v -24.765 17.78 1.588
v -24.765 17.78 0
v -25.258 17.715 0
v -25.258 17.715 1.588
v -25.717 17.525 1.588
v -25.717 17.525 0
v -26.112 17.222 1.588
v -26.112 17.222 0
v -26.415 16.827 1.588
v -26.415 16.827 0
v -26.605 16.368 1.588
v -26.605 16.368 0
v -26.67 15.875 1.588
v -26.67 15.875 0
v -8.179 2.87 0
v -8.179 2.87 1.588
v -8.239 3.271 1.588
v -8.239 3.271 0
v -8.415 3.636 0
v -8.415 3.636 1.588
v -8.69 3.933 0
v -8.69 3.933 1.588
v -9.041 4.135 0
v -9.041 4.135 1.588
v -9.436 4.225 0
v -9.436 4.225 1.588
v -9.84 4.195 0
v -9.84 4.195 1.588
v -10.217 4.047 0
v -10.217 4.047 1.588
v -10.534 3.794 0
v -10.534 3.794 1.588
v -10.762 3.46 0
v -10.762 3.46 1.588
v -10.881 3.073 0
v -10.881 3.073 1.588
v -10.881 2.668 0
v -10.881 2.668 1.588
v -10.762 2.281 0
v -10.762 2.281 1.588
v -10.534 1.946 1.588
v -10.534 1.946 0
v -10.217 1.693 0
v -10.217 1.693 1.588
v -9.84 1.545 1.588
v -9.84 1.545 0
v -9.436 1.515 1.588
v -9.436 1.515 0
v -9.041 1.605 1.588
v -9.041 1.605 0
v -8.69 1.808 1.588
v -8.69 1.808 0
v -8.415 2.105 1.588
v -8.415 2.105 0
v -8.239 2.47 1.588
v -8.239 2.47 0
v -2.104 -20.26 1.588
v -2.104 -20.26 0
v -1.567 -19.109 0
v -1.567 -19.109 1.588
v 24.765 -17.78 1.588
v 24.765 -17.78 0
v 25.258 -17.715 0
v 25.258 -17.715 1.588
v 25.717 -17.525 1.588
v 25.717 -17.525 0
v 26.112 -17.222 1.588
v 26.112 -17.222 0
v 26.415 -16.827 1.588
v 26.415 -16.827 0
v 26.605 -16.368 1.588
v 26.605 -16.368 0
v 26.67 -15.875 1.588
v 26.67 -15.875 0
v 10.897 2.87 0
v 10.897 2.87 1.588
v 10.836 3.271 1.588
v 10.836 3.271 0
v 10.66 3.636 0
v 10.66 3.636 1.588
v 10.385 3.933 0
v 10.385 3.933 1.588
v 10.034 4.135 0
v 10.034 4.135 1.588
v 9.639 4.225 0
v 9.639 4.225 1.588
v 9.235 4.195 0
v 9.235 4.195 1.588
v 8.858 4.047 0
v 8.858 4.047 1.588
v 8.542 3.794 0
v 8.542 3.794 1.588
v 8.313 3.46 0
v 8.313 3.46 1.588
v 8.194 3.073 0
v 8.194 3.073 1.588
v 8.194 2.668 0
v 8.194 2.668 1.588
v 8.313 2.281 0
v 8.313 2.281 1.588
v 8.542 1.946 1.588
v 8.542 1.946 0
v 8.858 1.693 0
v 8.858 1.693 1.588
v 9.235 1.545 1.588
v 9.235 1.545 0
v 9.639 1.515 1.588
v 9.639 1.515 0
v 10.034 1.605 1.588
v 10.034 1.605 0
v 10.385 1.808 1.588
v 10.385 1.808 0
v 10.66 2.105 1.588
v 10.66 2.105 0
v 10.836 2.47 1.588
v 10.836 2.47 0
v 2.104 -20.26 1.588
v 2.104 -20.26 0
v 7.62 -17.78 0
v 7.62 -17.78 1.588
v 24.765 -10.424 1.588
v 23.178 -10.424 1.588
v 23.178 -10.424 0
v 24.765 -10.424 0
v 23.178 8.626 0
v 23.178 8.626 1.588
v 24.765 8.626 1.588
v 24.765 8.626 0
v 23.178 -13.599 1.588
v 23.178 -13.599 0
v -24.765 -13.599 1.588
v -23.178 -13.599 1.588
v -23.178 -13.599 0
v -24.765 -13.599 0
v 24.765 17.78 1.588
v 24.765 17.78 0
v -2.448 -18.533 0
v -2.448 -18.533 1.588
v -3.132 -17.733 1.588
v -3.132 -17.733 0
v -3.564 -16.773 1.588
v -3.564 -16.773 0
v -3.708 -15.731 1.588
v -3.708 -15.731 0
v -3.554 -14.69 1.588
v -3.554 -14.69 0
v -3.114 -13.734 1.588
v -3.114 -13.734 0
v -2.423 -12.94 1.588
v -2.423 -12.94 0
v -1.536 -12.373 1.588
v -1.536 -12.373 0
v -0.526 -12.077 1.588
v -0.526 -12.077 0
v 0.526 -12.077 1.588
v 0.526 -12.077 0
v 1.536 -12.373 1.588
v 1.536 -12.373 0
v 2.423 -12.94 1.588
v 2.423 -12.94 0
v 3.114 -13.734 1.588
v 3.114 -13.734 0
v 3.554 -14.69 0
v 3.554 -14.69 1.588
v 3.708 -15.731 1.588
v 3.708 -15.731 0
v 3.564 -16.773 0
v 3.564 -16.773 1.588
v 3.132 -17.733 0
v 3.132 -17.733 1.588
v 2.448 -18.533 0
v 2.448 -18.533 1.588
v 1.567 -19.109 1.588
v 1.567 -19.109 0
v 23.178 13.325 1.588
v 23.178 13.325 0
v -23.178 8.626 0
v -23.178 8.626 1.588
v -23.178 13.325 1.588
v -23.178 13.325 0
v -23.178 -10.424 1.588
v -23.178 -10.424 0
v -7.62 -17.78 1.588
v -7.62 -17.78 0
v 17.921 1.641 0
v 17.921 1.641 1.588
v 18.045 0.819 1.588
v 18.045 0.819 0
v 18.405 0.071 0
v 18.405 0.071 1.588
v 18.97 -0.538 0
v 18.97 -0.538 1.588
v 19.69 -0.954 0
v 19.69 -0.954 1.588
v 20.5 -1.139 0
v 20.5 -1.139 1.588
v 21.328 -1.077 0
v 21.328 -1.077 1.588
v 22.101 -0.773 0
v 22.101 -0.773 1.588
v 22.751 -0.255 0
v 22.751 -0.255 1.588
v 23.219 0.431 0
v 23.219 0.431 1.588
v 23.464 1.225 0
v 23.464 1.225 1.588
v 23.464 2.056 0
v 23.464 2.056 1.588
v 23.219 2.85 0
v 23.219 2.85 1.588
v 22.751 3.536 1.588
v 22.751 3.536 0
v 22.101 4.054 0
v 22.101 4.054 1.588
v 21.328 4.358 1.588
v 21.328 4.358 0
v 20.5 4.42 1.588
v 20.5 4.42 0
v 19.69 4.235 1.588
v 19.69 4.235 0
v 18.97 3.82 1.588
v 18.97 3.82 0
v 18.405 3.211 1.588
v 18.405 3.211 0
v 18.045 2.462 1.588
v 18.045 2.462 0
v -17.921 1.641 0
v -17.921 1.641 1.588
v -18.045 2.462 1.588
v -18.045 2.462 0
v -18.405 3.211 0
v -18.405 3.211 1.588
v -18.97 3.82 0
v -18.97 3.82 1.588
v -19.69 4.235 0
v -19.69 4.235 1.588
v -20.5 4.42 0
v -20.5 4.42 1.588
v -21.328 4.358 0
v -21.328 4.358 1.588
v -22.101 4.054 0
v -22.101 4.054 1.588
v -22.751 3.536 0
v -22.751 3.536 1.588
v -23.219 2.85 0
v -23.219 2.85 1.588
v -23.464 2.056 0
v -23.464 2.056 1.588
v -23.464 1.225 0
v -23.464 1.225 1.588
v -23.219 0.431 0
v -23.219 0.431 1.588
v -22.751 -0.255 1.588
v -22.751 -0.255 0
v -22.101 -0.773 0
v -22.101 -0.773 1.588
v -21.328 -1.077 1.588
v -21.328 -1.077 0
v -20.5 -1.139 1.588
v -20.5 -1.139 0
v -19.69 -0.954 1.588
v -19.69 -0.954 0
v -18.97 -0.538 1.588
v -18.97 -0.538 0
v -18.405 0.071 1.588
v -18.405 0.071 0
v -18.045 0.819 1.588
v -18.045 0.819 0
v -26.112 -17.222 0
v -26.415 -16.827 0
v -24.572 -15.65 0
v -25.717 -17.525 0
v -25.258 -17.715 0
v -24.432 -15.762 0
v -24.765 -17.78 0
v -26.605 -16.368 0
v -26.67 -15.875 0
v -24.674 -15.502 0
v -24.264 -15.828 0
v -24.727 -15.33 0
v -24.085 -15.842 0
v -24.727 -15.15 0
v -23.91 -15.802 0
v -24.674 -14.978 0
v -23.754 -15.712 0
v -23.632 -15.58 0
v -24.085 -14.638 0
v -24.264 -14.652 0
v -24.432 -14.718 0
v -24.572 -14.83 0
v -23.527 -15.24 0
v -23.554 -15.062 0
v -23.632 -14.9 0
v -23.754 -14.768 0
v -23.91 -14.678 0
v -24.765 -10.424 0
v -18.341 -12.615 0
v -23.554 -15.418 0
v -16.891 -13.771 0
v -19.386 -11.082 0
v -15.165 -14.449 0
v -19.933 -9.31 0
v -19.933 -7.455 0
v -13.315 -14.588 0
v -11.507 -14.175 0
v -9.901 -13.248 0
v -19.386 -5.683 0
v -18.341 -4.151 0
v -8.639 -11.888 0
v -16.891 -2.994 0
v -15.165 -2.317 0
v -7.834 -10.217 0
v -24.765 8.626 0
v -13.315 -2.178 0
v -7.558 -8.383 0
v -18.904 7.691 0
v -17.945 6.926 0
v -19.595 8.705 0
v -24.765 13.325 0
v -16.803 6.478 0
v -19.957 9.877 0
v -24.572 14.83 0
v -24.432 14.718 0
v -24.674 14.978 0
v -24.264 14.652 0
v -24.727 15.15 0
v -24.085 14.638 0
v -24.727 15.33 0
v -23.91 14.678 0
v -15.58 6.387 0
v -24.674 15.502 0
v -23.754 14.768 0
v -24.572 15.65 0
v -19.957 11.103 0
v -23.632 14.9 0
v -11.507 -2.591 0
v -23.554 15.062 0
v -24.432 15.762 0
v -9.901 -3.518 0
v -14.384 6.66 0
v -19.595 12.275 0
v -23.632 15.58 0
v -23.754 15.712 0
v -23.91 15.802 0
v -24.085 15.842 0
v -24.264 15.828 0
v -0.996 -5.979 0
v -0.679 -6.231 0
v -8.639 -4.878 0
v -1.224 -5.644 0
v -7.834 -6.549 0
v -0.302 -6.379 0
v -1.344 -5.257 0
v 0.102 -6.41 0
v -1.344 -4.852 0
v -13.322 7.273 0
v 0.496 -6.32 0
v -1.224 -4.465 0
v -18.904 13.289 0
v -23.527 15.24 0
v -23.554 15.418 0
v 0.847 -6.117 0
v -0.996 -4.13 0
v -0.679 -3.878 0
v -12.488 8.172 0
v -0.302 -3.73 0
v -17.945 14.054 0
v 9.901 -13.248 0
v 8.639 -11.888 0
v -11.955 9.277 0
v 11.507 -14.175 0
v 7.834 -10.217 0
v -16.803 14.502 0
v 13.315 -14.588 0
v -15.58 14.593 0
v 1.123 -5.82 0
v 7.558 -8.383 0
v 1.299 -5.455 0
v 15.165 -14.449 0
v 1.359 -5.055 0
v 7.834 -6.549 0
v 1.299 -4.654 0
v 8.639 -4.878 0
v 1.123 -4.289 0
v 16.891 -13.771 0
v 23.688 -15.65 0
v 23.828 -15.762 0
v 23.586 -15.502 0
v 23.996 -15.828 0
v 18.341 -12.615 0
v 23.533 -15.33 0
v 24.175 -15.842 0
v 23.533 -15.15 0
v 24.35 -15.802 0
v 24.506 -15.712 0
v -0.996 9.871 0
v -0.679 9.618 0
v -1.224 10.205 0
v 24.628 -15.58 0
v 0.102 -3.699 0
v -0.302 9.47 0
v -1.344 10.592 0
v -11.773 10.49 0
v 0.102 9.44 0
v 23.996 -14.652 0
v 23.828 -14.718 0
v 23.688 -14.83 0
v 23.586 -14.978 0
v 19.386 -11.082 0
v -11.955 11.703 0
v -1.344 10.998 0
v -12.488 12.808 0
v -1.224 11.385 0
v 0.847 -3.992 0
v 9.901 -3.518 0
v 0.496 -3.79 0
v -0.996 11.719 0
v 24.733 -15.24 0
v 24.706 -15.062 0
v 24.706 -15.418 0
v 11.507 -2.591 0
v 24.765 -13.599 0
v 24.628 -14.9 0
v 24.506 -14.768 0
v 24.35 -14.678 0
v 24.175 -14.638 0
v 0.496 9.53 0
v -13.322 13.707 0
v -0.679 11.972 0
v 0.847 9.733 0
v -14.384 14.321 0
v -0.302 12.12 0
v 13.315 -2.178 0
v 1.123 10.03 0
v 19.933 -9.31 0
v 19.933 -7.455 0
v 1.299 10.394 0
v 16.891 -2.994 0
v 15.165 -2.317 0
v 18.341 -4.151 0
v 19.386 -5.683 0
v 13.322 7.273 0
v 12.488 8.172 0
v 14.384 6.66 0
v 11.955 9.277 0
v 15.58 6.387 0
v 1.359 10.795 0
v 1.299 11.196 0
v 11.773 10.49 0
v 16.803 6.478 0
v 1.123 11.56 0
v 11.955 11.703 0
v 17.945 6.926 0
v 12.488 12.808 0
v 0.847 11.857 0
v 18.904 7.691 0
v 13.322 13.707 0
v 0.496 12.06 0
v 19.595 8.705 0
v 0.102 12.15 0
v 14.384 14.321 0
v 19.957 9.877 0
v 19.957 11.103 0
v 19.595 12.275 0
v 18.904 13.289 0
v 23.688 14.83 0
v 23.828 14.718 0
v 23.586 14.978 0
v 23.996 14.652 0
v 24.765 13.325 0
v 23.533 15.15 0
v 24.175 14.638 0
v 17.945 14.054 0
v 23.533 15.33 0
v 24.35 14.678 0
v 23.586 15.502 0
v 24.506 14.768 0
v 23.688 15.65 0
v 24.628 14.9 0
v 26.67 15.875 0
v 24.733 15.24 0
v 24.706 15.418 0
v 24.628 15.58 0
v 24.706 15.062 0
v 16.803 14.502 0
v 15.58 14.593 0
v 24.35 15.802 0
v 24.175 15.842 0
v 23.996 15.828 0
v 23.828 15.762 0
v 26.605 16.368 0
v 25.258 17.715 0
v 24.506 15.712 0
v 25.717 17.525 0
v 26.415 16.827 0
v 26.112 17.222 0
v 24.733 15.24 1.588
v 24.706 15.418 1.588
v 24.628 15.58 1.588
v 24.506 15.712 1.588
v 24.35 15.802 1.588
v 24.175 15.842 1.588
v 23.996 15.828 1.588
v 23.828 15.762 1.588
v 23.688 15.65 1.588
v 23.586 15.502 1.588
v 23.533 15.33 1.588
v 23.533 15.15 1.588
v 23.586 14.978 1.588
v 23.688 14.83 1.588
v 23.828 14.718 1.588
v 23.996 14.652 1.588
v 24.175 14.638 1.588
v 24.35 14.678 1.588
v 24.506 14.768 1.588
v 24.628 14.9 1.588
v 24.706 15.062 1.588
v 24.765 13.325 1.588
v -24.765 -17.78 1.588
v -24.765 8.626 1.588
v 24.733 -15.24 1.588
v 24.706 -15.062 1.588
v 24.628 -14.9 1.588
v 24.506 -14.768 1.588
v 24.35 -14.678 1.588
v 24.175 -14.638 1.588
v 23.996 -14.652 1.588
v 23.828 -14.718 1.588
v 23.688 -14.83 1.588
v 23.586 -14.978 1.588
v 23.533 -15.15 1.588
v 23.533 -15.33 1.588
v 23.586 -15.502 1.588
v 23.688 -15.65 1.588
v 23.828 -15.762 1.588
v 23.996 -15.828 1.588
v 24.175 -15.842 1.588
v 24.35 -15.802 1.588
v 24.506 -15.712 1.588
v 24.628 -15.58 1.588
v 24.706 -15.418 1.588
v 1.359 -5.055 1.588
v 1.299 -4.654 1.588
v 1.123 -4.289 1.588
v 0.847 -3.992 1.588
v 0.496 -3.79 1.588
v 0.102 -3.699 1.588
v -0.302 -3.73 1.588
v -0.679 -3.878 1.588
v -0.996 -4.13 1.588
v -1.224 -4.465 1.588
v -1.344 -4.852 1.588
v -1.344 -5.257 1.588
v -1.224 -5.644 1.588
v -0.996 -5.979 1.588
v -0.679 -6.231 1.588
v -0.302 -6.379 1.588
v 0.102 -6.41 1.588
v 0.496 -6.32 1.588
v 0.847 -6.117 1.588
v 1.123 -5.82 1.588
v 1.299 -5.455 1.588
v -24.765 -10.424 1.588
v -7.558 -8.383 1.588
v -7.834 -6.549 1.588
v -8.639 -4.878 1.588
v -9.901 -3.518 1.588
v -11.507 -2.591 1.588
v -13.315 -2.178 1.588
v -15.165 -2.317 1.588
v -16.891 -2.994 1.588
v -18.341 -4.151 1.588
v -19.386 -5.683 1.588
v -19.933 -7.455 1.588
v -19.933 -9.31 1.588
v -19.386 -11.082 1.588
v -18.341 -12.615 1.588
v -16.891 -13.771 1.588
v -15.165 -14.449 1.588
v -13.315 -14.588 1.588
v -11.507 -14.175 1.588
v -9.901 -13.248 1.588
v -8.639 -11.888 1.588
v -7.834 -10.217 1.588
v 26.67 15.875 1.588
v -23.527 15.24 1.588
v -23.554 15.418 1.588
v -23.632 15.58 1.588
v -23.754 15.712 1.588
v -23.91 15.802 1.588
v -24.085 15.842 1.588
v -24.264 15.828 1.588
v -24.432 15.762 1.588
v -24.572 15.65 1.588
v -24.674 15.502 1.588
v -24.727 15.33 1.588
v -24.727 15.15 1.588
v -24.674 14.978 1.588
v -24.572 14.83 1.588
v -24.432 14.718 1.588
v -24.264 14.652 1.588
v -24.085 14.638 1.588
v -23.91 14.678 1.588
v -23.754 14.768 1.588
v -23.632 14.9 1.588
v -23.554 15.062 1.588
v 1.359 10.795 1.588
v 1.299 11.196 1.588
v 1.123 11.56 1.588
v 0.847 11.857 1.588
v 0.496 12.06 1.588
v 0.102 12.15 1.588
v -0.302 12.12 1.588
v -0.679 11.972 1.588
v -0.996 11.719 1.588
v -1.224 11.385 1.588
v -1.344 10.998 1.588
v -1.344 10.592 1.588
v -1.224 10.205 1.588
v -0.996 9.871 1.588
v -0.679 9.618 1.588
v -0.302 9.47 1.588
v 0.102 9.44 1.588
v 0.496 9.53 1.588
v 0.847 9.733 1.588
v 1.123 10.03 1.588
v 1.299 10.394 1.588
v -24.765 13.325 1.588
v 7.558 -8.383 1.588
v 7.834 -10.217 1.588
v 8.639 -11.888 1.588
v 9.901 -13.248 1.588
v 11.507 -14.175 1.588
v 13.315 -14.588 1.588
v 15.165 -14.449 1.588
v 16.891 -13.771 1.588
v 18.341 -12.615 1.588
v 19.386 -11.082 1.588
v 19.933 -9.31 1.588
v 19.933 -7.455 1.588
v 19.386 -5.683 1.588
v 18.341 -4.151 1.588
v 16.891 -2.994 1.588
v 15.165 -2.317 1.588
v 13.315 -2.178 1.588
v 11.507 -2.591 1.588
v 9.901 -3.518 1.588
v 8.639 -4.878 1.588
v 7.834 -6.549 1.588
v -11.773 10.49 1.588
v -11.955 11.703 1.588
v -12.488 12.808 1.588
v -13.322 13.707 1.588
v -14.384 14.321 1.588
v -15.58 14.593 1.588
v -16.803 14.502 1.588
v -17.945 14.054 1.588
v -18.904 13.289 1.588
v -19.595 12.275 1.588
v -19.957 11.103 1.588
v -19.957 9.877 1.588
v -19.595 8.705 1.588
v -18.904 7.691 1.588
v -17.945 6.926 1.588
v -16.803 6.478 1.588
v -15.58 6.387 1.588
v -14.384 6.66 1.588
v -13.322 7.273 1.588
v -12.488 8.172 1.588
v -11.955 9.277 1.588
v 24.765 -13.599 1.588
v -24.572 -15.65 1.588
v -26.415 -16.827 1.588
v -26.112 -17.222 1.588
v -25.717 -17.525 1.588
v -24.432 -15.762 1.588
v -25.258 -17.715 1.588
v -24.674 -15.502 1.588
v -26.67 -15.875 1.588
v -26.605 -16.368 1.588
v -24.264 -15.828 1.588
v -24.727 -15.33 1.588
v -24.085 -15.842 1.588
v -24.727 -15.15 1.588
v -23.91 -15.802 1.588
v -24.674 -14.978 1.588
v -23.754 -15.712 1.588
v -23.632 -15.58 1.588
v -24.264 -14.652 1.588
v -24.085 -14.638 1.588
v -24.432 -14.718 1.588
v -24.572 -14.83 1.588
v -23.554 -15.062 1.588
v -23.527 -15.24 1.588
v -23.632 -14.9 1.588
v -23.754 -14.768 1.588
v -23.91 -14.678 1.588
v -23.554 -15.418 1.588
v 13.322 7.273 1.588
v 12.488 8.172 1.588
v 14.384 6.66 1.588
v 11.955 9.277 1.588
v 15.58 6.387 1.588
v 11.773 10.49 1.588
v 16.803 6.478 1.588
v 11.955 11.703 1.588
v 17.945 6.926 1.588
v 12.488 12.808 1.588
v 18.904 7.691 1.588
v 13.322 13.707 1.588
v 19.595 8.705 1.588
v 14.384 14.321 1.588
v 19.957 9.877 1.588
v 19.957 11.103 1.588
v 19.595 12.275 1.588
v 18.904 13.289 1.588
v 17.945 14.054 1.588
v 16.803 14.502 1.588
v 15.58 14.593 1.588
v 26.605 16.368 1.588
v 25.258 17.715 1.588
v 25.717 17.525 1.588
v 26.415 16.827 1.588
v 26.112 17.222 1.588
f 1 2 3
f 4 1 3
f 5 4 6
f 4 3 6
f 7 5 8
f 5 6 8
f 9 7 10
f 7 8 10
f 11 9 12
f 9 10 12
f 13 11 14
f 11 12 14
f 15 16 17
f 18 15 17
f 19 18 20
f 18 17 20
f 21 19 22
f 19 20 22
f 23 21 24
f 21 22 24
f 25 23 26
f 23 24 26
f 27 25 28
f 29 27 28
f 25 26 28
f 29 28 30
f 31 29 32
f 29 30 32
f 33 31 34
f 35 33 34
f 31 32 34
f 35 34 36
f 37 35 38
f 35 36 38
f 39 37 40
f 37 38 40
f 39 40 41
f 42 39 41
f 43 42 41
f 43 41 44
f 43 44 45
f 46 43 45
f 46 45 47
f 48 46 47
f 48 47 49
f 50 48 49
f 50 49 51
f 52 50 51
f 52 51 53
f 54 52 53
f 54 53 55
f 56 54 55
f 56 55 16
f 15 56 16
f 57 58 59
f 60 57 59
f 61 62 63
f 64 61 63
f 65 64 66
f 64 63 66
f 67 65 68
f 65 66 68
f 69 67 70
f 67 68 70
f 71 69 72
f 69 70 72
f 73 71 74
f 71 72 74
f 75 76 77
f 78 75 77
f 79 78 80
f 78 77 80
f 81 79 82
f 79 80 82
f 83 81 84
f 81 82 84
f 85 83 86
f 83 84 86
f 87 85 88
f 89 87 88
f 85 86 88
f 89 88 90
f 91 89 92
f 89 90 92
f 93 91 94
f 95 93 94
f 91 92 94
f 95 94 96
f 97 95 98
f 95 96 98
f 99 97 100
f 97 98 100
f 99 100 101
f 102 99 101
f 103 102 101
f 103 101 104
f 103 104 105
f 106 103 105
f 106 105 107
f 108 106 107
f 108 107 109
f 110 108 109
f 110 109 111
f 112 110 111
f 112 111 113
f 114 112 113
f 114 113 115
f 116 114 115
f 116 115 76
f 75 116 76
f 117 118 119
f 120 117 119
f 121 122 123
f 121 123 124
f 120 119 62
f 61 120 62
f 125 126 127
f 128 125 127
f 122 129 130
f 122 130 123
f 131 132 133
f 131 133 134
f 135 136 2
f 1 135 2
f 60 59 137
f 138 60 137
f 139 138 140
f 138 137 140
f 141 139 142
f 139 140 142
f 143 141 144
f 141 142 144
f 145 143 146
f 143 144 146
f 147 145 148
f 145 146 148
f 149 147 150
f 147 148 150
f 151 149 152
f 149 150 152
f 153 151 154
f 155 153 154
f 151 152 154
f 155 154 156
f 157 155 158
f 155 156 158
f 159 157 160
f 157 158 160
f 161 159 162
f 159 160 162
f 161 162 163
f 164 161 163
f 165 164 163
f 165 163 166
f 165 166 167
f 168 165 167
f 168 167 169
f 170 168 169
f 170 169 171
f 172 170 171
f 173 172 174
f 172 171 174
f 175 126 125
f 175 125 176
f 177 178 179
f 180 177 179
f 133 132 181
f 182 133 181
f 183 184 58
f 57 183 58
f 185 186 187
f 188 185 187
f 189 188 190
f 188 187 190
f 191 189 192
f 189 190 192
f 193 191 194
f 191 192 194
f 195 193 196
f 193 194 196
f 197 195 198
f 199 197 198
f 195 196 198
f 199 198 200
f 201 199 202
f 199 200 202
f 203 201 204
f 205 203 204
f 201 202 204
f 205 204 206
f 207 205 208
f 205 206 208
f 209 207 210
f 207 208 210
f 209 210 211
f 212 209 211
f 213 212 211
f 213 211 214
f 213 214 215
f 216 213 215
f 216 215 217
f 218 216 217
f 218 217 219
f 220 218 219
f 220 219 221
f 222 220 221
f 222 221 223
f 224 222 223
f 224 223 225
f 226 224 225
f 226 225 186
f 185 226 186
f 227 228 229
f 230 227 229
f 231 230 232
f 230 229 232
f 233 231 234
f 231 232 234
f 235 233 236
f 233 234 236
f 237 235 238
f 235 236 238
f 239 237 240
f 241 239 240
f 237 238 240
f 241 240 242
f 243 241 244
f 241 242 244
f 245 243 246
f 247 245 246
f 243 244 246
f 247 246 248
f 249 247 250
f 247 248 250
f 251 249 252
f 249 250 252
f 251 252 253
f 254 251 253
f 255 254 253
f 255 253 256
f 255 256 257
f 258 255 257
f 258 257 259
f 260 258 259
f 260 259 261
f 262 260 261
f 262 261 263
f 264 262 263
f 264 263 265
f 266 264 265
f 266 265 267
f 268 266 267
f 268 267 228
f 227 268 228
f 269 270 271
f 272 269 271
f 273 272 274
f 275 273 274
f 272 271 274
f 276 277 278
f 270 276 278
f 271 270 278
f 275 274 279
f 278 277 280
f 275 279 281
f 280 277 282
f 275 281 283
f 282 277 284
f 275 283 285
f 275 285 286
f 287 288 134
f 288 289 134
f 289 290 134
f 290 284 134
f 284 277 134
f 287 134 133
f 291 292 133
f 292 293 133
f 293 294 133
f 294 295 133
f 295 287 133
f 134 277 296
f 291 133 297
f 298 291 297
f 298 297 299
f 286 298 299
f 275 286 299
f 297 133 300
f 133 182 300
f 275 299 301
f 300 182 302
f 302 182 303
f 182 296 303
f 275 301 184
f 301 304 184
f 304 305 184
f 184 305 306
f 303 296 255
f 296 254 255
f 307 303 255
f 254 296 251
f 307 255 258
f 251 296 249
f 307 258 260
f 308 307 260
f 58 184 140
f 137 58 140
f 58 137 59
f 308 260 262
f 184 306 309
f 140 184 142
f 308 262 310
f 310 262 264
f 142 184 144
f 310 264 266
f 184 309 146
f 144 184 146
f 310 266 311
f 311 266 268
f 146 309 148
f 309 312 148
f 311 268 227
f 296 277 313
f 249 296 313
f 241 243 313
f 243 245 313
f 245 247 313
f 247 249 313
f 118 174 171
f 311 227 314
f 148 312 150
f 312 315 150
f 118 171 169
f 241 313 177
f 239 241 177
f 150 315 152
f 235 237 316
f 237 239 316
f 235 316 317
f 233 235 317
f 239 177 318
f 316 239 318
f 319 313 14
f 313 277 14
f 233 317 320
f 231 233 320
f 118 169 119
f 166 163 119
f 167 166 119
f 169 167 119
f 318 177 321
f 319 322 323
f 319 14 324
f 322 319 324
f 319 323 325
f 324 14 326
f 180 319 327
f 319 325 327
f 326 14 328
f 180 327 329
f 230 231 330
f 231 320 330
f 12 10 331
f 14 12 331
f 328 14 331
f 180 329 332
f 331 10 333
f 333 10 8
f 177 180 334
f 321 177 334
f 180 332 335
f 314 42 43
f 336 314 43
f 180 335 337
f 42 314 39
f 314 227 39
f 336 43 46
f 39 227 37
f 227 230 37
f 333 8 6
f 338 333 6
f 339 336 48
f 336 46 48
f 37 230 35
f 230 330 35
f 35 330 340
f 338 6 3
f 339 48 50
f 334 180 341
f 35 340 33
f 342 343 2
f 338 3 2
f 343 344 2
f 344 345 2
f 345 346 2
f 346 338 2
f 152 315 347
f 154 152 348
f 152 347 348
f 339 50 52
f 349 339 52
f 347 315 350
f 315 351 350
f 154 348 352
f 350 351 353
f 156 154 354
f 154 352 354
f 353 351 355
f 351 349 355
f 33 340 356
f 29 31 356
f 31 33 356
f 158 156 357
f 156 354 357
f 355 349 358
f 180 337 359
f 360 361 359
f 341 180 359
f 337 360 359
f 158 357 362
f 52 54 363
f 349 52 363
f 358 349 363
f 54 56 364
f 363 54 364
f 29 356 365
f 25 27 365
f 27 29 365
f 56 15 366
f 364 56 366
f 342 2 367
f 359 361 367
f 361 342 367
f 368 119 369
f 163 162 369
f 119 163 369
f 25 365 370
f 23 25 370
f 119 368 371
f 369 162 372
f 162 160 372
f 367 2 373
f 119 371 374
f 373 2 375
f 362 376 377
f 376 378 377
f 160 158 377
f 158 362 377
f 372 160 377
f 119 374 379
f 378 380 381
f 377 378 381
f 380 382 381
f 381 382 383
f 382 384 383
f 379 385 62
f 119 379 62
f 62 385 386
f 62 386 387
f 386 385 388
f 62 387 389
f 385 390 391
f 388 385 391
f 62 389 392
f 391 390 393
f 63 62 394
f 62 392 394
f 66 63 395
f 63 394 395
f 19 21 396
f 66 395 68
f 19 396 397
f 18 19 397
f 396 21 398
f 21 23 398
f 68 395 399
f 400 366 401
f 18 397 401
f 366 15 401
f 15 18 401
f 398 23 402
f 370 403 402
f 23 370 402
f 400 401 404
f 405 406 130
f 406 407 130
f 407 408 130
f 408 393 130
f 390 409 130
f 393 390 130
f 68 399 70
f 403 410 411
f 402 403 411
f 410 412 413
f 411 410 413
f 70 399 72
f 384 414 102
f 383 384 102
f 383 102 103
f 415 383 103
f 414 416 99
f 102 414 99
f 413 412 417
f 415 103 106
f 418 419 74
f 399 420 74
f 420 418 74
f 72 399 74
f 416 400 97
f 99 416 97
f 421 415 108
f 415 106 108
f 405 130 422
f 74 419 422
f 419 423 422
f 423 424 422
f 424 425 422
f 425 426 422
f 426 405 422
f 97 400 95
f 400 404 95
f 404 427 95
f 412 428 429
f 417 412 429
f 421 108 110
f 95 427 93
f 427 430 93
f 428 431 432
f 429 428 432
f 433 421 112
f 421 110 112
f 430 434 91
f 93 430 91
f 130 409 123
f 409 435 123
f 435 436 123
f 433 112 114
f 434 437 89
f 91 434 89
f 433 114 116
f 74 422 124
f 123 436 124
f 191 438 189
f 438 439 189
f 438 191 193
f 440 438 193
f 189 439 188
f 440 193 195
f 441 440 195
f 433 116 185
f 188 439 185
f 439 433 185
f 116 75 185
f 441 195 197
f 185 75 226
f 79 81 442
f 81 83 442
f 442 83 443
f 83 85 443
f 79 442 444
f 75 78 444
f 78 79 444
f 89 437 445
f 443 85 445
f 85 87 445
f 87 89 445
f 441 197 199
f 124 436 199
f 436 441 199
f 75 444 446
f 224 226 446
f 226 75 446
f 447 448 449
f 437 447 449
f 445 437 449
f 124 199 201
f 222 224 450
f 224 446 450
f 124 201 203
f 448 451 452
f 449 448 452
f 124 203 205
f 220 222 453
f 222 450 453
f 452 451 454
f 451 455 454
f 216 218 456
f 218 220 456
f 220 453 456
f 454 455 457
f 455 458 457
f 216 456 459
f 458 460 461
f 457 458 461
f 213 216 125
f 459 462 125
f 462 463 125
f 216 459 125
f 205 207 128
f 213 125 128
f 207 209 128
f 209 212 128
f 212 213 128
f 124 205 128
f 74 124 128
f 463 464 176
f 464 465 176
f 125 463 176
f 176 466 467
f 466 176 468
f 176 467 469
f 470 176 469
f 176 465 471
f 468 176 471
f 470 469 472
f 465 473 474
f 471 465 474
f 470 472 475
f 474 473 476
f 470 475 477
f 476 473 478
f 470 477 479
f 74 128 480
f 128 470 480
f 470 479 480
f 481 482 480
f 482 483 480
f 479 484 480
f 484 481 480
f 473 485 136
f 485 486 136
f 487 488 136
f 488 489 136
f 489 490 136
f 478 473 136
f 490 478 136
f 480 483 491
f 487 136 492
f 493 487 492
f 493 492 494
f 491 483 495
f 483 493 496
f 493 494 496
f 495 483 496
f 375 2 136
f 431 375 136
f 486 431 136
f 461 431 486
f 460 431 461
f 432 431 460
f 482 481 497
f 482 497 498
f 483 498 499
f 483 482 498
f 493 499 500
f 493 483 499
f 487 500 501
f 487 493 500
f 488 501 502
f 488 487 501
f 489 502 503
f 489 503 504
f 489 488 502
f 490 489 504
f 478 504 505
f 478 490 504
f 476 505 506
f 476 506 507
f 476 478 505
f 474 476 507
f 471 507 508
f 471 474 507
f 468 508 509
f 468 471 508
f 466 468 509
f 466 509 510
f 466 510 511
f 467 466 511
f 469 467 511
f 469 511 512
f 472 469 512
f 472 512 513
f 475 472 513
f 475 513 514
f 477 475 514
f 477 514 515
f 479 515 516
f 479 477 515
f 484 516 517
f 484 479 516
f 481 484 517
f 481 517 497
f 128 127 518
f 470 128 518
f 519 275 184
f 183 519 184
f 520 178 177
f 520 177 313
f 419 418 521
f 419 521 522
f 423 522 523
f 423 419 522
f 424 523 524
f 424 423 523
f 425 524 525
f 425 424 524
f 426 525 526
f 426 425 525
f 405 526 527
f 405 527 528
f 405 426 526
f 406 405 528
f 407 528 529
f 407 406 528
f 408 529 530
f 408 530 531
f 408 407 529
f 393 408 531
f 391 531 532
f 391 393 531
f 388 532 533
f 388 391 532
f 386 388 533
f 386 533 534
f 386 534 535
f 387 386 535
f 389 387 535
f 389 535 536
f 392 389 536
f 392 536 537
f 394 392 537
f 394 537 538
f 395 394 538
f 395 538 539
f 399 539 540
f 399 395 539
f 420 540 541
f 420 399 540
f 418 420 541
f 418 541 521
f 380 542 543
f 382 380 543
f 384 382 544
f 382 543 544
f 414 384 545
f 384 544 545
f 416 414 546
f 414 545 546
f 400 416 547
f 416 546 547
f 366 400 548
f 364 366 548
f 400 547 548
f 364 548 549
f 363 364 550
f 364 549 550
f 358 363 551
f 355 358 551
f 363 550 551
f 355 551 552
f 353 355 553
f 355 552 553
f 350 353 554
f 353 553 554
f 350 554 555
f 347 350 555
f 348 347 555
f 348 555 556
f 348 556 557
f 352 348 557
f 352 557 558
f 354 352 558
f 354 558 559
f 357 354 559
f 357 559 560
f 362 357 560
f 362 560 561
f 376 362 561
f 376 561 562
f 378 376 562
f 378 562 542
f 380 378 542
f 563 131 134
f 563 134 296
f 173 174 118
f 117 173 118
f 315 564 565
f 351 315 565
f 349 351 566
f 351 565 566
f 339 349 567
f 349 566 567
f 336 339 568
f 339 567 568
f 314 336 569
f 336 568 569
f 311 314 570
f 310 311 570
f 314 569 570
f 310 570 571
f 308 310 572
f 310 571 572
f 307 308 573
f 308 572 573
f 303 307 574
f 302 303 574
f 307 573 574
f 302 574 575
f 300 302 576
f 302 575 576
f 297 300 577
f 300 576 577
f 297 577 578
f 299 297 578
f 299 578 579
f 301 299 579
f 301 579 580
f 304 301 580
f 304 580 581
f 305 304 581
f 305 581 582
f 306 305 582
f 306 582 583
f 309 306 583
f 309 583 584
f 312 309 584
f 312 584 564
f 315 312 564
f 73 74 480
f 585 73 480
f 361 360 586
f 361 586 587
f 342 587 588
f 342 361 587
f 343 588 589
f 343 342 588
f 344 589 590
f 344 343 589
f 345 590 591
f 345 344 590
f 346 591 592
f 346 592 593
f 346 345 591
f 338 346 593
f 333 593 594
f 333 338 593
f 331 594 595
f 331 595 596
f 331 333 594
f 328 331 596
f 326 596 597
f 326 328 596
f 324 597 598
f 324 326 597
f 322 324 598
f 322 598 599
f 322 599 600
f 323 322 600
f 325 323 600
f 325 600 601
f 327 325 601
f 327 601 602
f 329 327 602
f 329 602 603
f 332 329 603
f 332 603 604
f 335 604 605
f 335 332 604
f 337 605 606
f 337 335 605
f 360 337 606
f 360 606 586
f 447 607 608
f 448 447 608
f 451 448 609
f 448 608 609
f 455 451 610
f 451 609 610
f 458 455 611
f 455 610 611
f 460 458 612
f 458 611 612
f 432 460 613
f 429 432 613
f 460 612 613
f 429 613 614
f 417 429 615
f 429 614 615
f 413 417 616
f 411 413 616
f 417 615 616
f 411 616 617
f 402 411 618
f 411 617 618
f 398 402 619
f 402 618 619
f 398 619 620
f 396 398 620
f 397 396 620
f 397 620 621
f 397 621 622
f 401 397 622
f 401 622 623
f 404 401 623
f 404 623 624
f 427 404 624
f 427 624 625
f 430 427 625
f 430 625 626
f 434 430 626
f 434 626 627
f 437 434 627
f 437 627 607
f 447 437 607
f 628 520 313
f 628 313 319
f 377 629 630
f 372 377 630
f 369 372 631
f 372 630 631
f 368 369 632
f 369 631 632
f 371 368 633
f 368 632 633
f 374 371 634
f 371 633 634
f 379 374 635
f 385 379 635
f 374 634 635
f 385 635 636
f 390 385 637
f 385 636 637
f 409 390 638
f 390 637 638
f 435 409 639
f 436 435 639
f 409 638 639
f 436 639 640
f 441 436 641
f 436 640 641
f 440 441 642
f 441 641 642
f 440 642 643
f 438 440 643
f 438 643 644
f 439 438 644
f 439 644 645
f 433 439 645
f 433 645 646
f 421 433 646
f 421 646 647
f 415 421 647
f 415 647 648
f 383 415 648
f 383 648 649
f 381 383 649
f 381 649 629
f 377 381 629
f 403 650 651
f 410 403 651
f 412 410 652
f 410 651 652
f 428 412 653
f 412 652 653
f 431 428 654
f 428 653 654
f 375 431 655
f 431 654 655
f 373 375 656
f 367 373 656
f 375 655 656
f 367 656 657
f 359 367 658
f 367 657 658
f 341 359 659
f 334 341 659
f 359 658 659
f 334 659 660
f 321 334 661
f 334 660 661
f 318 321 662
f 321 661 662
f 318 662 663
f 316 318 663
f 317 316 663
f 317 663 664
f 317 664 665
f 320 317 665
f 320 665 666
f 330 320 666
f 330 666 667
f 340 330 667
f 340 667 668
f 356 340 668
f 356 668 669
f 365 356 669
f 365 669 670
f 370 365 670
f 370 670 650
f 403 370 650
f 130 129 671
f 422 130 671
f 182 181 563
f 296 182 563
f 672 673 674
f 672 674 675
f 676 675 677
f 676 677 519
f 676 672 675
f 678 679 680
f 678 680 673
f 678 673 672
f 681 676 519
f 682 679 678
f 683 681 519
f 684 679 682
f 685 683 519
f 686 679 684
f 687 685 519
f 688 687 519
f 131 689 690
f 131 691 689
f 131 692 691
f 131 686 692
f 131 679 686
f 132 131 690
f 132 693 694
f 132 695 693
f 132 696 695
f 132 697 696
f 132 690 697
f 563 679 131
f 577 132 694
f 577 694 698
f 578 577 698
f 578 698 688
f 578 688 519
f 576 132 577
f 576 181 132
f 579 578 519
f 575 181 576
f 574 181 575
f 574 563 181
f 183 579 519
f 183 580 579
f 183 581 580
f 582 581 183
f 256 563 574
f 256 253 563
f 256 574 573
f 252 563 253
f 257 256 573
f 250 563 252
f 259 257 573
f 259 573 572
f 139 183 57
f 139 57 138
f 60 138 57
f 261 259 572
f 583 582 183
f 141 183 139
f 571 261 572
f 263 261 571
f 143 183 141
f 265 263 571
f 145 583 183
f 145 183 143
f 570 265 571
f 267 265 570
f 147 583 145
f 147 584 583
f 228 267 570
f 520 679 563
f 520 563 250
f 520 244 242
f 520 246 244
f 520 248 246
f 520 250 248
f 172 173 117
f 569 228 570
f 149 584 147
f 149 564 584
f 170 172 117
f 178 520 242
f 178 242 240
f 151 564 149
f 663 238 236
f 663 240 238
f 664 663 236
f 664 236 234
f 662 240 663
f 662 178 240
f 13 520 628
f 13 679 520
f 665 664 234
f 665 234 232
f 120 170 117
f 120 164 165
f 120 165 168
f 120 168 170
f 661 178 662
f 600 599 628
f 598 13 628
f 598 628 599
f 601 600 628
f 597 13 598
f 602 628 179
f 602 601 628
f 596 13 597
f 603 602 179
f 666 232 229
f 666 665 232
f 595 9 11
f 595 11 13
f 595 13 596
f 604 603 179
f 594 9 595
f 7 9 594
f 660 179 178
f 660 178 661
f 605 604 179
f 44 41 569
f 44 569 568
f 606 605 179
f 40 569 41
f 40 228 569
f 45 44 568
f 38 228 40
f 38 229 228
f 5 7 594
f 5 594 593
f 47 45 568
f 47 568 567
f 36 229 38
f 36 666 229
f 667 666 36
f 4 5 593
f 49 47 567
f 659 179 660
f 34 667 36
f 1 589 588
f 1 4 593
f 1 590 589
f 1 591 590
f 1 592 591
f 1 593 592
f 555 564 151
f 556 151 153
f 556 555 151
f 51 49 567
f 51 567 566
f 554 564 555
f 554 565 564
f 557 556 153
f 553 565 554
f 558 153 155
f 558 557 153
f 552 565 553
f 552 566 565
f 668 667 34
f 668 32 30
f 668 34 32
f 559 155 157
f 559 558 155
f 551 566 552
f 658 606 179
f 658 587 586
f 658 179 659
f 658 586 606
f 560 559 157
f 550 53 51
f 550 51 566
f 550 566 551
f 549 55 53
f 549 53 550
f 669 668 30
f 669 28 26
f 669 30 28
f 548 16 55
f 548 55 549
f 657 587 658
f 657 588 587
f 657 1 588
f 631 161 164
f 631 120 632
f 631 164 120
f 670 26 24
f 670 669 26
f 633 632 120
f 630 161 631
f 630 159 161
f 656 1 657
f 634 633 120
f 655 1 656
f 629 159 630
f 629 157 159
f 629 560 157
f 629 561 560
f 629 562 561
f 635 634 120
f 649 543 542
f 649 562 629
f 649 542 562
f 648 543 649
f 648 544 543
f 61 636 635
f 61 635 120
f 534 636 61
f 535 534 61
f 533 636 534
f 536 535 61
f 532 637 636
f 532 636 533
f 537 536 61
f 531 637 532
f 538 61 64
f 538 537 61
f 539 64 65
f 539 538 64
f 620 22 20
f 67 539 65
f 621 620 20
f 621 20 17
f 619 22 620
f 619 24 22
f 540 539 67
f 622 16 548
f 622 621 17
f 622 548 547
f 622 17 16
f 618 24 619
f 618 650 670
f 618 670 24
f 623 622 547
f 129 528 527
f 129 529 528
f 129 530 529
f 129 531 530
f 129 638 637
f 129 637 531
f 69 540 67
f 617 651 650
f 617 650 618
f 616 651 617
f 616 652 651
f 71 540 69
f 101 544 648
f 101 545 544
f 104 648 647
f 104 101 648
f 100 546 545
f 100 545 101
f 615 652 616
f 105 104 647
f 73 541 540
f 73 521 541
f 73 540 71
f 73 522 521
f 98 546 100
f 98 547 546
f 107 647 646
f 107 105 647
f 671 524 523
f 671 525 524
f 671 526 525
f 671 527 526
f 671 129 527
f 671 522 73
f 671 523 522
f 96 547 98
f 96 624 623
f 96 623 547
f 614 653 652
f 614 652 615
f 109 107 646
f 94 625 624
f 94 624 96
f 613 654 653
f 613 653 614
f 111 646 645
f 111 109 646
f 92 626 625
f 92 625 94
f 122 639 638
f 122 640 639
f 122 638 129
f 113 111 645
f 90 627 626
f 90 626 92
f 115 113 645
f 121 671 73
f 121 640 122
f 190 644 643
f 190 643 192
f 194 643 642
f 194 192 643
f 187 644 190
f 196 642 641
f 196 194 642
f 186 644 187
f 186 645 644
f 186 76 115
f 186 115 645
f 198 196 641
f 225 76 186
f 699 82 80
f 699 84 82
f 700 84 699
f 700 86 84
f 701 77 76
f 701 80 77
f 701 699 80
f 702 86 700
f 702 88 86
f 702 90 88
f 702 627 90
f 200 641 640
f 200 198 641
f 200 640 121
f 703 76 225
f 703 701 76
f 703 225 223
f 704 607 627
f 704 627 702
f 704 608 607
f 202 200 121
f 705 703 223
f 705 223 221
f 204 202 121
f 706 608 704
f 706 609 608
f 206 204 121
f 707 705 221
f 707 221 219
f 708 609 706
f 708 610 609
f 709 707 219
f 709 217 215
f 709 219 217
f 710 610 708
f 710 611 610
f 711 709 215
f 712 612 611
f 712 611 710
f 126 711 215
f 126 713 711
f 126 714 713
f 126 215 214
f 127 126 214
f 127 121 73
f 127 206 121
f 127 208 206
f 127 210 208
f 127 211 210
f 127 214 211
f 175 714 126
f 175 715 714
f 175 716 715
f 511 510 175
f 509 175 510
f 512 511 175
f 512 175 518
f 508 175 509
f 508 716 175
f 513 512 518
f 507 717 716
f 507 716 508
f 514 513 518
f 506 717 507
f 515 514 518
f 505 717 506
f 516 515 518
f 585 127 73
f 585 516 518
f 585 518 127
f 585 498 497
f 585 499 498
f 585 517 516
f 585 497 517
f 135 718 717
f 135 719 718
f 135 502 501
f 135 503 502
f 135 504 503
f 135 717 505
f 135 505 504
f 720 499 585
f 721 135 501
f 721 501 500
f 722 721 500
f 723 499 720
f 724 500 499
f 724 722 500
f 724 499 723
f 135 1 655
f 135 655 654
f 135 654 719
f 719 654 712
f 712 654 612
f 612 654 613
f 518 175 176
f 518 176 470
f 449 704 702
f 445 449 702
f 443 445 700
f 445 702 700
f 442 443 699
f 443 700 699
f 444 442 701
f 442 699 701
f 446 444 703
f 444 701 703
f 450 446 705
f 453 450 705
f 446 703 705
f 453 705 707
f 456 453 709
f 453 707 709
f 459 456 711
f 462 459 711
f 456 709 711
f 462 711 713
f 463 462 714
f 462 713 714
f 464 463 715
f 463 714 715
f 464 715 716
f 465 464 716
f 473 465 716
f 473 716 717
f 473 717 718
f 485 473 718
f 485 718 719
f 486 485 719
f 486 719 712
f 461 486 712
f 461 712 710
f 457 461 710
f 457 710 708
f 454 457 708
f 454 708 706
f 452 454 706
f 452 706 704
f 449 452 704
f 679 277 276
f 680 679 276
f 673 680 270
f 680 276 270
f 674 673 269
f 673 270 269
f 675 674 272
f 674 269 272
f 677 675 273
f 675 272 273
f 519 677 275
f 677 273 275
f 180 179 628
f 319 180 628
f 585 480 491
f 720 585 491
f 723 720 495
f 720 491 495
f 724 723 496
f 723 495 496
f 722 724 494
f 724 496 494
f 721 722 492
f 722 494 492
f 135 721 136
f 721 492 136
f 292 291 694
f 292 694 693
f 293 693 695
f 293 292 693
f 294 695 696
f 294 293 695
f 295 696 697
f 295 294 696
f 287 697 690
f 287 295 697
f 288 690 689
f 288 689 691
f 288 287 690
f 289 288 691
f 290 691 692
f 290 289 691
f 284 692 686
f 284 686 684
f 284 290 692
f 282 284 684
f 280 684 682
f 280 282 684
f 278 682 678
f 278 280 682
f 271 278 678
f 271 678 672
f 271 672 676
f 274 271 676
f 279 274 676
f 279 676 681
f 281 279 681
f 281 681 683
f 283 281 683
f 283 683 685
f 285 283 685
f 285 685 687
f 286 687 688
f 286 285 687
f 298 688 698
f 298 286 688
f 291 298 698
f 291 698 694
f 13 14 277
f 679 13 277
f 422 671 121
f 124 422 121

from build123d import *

# Parameters (mm, degrees)
SKETCH1_R           = 0.60325
BOSS_EXTRUDE1_DEPTH = 1.5875
SKETCH5_W           = 1.5875
SKETCH5_H           = 3.175
SKETCH5_H_2         = 4.699
CUT_EXTRUDE1_DEPTH  = 34.530212411
SKETCH7_R           = 1.3589
CUT_EXTRUDE2_DEPTH  = 34.530212411
SKETCH8_R           = 6.222246918
SKETCH8_R_2         = 4.114931659
CUT_EXTRUDE3_DEPTH  = 34.530212411
SKETCH9_R           = 2.787155445
CUT_EXTRUDE4_DEPTH  = 34.530212411


with BuildPart() as part:
    # Sketch1 → Boss-Extrude1 (new body)
    with BuildSketch(Plane.XY):
        with BuildLine():
            ThreePointArc((26.67, 15.875), (26.112038418, 17.222038418), (24.765, 17.78))
            Line((24.765, 17.78), (-24.765, 17.78))
            ThreePointArc((-24.765, 17.78), (-26.112038418, 17.222038418), (-26.67, 15.875))
            Line((-26.67, 15.875), (-26.67, -15.875))
            ThreePointArc((-26.67, -15.875), (-26.112038418, -17.222038418), (-24.765, -17.78))
            Line((-24.765, -17.78), (-7.62, -17.78))
            Line((-7.62, -17.78), (-2.103962754, -20.259962687))
            Line((-2.103962754, -20.259962687), (-1.567237562, -19.108951797))
            ThreePointArc((-1.567237562, -19.108951797), (0, -12.0396), (1.567237562, -19.108951797))
            Line((1.567237562, -19.108951797), (2.103962754, -20.259962687))
            Line((2.103962754, -20.259962687), (7.62, -17.78))
            Line((7.62, -17.78), (24.765, -17.78))
            ThreePointArc((24.765, -17.78), (26.112038418, -17.222038418), (26.67, -15.875))
            Line((26.67, -15.875), (26.67, 15.875))
        make_face()
        with Locations((-24.13, -15.24)):
            Circle(SKETCH1_R, mode=Mode.SUBTRACT)
        with Locations((24.13, -15.24)):
            Circle(SKETCH1_R, mode=Mode.SUBTRACT)
        with Locations((-24.13, 15.24)):
            Circle(SKETCH1_R, mode=Mode.SUBTRACT)
        with Locations((24.13, 15.24)):
            Circle(SKETCH1_R, mode=Mode.SUBTRACT)
    extrude(amount=BOSS_EXTRUDE1_DEPTH)

    # Sketch5 → Cut-Extrude1 (cut, through all)
    with BuildSketch(Plane.XY.offset(1.5875)):
        with Locations((23.97125, -12.011129894)):
            Rectangle(SKETCH5_W, SKETCH5_H)
        with Locations((23.97125, 10.975870106)):
            Rectangle(SKETCH5_W, SKETCH5_H_2)
    cut_extrude1 = extrude(amount=-CUT_EXTRUDE1_DEPTH, mode=Mode.SUBTRACT)

    # Mirror1: Cut-Extrude1 across plane
    add(cut_extrude1.mirror(Plane(origin=(0, 0, 0), x_dir=(0, 0, 1), z_dir=(1, 0, 0))), mode=Mode.SUBTRACT)

    # Sketch7 → Cut-Extrude2 (cut, through all)
    with BuildSketch(Plane.XY.offset(1.5875)):
        with Locations((0, 10.795)):
            Circle(SKETCH7_R)
        with Locations((9.5377, 2.8702)):
            Circle(SKETCH7_R)
        with Locations((-9.5377, 2.8702)):
            Circle(SKETCH7_R)
        with Locations((0, -5.0546)):
            Circle(SKETCH7_R)
    extrude(amount=-CUT_EXTRUDE2_DEPTH, mode=Mode.SUBTRACT)

    # Sketch8 → Cut-Extrude3 (cut, through all)
    with BuildSketch(Plane.XY.offset(1.5875)):
        with Locations((13.780253082, -8.382753082)):
            Circle(SKETCH8_R)
        with Locations((-15.887568341, 10.490068341)):
            Circle(SKETCH8_R_2)
        with Locations((-13.780253082, -8.382753082)):
            Circle(SKETCH8_R)
        with Locations((15.887568341, 10.490068341)):
            Circle(SKETCH8_R_2)
    extrude(amount=-CUT_EXTRUDE3_DEPTH, mode=Mode.SUBTRACT)

    # Sketch9 → Cut-Extrude4 (cut, through all)
    with BuildSketch(Plane.XY.offset(1.5875)):
        with Locations((-20.707844555, 1.640626454)):
            Circle(SKETCH9_R)
        with Locations((20.707844555, 1.640626454)):
            Circle(SKETCH9_R)
    extrude(amount=-CUT_EXTRUDE4_DEPTH, mode=Mode.SUBTRACT)


solid = part.part
